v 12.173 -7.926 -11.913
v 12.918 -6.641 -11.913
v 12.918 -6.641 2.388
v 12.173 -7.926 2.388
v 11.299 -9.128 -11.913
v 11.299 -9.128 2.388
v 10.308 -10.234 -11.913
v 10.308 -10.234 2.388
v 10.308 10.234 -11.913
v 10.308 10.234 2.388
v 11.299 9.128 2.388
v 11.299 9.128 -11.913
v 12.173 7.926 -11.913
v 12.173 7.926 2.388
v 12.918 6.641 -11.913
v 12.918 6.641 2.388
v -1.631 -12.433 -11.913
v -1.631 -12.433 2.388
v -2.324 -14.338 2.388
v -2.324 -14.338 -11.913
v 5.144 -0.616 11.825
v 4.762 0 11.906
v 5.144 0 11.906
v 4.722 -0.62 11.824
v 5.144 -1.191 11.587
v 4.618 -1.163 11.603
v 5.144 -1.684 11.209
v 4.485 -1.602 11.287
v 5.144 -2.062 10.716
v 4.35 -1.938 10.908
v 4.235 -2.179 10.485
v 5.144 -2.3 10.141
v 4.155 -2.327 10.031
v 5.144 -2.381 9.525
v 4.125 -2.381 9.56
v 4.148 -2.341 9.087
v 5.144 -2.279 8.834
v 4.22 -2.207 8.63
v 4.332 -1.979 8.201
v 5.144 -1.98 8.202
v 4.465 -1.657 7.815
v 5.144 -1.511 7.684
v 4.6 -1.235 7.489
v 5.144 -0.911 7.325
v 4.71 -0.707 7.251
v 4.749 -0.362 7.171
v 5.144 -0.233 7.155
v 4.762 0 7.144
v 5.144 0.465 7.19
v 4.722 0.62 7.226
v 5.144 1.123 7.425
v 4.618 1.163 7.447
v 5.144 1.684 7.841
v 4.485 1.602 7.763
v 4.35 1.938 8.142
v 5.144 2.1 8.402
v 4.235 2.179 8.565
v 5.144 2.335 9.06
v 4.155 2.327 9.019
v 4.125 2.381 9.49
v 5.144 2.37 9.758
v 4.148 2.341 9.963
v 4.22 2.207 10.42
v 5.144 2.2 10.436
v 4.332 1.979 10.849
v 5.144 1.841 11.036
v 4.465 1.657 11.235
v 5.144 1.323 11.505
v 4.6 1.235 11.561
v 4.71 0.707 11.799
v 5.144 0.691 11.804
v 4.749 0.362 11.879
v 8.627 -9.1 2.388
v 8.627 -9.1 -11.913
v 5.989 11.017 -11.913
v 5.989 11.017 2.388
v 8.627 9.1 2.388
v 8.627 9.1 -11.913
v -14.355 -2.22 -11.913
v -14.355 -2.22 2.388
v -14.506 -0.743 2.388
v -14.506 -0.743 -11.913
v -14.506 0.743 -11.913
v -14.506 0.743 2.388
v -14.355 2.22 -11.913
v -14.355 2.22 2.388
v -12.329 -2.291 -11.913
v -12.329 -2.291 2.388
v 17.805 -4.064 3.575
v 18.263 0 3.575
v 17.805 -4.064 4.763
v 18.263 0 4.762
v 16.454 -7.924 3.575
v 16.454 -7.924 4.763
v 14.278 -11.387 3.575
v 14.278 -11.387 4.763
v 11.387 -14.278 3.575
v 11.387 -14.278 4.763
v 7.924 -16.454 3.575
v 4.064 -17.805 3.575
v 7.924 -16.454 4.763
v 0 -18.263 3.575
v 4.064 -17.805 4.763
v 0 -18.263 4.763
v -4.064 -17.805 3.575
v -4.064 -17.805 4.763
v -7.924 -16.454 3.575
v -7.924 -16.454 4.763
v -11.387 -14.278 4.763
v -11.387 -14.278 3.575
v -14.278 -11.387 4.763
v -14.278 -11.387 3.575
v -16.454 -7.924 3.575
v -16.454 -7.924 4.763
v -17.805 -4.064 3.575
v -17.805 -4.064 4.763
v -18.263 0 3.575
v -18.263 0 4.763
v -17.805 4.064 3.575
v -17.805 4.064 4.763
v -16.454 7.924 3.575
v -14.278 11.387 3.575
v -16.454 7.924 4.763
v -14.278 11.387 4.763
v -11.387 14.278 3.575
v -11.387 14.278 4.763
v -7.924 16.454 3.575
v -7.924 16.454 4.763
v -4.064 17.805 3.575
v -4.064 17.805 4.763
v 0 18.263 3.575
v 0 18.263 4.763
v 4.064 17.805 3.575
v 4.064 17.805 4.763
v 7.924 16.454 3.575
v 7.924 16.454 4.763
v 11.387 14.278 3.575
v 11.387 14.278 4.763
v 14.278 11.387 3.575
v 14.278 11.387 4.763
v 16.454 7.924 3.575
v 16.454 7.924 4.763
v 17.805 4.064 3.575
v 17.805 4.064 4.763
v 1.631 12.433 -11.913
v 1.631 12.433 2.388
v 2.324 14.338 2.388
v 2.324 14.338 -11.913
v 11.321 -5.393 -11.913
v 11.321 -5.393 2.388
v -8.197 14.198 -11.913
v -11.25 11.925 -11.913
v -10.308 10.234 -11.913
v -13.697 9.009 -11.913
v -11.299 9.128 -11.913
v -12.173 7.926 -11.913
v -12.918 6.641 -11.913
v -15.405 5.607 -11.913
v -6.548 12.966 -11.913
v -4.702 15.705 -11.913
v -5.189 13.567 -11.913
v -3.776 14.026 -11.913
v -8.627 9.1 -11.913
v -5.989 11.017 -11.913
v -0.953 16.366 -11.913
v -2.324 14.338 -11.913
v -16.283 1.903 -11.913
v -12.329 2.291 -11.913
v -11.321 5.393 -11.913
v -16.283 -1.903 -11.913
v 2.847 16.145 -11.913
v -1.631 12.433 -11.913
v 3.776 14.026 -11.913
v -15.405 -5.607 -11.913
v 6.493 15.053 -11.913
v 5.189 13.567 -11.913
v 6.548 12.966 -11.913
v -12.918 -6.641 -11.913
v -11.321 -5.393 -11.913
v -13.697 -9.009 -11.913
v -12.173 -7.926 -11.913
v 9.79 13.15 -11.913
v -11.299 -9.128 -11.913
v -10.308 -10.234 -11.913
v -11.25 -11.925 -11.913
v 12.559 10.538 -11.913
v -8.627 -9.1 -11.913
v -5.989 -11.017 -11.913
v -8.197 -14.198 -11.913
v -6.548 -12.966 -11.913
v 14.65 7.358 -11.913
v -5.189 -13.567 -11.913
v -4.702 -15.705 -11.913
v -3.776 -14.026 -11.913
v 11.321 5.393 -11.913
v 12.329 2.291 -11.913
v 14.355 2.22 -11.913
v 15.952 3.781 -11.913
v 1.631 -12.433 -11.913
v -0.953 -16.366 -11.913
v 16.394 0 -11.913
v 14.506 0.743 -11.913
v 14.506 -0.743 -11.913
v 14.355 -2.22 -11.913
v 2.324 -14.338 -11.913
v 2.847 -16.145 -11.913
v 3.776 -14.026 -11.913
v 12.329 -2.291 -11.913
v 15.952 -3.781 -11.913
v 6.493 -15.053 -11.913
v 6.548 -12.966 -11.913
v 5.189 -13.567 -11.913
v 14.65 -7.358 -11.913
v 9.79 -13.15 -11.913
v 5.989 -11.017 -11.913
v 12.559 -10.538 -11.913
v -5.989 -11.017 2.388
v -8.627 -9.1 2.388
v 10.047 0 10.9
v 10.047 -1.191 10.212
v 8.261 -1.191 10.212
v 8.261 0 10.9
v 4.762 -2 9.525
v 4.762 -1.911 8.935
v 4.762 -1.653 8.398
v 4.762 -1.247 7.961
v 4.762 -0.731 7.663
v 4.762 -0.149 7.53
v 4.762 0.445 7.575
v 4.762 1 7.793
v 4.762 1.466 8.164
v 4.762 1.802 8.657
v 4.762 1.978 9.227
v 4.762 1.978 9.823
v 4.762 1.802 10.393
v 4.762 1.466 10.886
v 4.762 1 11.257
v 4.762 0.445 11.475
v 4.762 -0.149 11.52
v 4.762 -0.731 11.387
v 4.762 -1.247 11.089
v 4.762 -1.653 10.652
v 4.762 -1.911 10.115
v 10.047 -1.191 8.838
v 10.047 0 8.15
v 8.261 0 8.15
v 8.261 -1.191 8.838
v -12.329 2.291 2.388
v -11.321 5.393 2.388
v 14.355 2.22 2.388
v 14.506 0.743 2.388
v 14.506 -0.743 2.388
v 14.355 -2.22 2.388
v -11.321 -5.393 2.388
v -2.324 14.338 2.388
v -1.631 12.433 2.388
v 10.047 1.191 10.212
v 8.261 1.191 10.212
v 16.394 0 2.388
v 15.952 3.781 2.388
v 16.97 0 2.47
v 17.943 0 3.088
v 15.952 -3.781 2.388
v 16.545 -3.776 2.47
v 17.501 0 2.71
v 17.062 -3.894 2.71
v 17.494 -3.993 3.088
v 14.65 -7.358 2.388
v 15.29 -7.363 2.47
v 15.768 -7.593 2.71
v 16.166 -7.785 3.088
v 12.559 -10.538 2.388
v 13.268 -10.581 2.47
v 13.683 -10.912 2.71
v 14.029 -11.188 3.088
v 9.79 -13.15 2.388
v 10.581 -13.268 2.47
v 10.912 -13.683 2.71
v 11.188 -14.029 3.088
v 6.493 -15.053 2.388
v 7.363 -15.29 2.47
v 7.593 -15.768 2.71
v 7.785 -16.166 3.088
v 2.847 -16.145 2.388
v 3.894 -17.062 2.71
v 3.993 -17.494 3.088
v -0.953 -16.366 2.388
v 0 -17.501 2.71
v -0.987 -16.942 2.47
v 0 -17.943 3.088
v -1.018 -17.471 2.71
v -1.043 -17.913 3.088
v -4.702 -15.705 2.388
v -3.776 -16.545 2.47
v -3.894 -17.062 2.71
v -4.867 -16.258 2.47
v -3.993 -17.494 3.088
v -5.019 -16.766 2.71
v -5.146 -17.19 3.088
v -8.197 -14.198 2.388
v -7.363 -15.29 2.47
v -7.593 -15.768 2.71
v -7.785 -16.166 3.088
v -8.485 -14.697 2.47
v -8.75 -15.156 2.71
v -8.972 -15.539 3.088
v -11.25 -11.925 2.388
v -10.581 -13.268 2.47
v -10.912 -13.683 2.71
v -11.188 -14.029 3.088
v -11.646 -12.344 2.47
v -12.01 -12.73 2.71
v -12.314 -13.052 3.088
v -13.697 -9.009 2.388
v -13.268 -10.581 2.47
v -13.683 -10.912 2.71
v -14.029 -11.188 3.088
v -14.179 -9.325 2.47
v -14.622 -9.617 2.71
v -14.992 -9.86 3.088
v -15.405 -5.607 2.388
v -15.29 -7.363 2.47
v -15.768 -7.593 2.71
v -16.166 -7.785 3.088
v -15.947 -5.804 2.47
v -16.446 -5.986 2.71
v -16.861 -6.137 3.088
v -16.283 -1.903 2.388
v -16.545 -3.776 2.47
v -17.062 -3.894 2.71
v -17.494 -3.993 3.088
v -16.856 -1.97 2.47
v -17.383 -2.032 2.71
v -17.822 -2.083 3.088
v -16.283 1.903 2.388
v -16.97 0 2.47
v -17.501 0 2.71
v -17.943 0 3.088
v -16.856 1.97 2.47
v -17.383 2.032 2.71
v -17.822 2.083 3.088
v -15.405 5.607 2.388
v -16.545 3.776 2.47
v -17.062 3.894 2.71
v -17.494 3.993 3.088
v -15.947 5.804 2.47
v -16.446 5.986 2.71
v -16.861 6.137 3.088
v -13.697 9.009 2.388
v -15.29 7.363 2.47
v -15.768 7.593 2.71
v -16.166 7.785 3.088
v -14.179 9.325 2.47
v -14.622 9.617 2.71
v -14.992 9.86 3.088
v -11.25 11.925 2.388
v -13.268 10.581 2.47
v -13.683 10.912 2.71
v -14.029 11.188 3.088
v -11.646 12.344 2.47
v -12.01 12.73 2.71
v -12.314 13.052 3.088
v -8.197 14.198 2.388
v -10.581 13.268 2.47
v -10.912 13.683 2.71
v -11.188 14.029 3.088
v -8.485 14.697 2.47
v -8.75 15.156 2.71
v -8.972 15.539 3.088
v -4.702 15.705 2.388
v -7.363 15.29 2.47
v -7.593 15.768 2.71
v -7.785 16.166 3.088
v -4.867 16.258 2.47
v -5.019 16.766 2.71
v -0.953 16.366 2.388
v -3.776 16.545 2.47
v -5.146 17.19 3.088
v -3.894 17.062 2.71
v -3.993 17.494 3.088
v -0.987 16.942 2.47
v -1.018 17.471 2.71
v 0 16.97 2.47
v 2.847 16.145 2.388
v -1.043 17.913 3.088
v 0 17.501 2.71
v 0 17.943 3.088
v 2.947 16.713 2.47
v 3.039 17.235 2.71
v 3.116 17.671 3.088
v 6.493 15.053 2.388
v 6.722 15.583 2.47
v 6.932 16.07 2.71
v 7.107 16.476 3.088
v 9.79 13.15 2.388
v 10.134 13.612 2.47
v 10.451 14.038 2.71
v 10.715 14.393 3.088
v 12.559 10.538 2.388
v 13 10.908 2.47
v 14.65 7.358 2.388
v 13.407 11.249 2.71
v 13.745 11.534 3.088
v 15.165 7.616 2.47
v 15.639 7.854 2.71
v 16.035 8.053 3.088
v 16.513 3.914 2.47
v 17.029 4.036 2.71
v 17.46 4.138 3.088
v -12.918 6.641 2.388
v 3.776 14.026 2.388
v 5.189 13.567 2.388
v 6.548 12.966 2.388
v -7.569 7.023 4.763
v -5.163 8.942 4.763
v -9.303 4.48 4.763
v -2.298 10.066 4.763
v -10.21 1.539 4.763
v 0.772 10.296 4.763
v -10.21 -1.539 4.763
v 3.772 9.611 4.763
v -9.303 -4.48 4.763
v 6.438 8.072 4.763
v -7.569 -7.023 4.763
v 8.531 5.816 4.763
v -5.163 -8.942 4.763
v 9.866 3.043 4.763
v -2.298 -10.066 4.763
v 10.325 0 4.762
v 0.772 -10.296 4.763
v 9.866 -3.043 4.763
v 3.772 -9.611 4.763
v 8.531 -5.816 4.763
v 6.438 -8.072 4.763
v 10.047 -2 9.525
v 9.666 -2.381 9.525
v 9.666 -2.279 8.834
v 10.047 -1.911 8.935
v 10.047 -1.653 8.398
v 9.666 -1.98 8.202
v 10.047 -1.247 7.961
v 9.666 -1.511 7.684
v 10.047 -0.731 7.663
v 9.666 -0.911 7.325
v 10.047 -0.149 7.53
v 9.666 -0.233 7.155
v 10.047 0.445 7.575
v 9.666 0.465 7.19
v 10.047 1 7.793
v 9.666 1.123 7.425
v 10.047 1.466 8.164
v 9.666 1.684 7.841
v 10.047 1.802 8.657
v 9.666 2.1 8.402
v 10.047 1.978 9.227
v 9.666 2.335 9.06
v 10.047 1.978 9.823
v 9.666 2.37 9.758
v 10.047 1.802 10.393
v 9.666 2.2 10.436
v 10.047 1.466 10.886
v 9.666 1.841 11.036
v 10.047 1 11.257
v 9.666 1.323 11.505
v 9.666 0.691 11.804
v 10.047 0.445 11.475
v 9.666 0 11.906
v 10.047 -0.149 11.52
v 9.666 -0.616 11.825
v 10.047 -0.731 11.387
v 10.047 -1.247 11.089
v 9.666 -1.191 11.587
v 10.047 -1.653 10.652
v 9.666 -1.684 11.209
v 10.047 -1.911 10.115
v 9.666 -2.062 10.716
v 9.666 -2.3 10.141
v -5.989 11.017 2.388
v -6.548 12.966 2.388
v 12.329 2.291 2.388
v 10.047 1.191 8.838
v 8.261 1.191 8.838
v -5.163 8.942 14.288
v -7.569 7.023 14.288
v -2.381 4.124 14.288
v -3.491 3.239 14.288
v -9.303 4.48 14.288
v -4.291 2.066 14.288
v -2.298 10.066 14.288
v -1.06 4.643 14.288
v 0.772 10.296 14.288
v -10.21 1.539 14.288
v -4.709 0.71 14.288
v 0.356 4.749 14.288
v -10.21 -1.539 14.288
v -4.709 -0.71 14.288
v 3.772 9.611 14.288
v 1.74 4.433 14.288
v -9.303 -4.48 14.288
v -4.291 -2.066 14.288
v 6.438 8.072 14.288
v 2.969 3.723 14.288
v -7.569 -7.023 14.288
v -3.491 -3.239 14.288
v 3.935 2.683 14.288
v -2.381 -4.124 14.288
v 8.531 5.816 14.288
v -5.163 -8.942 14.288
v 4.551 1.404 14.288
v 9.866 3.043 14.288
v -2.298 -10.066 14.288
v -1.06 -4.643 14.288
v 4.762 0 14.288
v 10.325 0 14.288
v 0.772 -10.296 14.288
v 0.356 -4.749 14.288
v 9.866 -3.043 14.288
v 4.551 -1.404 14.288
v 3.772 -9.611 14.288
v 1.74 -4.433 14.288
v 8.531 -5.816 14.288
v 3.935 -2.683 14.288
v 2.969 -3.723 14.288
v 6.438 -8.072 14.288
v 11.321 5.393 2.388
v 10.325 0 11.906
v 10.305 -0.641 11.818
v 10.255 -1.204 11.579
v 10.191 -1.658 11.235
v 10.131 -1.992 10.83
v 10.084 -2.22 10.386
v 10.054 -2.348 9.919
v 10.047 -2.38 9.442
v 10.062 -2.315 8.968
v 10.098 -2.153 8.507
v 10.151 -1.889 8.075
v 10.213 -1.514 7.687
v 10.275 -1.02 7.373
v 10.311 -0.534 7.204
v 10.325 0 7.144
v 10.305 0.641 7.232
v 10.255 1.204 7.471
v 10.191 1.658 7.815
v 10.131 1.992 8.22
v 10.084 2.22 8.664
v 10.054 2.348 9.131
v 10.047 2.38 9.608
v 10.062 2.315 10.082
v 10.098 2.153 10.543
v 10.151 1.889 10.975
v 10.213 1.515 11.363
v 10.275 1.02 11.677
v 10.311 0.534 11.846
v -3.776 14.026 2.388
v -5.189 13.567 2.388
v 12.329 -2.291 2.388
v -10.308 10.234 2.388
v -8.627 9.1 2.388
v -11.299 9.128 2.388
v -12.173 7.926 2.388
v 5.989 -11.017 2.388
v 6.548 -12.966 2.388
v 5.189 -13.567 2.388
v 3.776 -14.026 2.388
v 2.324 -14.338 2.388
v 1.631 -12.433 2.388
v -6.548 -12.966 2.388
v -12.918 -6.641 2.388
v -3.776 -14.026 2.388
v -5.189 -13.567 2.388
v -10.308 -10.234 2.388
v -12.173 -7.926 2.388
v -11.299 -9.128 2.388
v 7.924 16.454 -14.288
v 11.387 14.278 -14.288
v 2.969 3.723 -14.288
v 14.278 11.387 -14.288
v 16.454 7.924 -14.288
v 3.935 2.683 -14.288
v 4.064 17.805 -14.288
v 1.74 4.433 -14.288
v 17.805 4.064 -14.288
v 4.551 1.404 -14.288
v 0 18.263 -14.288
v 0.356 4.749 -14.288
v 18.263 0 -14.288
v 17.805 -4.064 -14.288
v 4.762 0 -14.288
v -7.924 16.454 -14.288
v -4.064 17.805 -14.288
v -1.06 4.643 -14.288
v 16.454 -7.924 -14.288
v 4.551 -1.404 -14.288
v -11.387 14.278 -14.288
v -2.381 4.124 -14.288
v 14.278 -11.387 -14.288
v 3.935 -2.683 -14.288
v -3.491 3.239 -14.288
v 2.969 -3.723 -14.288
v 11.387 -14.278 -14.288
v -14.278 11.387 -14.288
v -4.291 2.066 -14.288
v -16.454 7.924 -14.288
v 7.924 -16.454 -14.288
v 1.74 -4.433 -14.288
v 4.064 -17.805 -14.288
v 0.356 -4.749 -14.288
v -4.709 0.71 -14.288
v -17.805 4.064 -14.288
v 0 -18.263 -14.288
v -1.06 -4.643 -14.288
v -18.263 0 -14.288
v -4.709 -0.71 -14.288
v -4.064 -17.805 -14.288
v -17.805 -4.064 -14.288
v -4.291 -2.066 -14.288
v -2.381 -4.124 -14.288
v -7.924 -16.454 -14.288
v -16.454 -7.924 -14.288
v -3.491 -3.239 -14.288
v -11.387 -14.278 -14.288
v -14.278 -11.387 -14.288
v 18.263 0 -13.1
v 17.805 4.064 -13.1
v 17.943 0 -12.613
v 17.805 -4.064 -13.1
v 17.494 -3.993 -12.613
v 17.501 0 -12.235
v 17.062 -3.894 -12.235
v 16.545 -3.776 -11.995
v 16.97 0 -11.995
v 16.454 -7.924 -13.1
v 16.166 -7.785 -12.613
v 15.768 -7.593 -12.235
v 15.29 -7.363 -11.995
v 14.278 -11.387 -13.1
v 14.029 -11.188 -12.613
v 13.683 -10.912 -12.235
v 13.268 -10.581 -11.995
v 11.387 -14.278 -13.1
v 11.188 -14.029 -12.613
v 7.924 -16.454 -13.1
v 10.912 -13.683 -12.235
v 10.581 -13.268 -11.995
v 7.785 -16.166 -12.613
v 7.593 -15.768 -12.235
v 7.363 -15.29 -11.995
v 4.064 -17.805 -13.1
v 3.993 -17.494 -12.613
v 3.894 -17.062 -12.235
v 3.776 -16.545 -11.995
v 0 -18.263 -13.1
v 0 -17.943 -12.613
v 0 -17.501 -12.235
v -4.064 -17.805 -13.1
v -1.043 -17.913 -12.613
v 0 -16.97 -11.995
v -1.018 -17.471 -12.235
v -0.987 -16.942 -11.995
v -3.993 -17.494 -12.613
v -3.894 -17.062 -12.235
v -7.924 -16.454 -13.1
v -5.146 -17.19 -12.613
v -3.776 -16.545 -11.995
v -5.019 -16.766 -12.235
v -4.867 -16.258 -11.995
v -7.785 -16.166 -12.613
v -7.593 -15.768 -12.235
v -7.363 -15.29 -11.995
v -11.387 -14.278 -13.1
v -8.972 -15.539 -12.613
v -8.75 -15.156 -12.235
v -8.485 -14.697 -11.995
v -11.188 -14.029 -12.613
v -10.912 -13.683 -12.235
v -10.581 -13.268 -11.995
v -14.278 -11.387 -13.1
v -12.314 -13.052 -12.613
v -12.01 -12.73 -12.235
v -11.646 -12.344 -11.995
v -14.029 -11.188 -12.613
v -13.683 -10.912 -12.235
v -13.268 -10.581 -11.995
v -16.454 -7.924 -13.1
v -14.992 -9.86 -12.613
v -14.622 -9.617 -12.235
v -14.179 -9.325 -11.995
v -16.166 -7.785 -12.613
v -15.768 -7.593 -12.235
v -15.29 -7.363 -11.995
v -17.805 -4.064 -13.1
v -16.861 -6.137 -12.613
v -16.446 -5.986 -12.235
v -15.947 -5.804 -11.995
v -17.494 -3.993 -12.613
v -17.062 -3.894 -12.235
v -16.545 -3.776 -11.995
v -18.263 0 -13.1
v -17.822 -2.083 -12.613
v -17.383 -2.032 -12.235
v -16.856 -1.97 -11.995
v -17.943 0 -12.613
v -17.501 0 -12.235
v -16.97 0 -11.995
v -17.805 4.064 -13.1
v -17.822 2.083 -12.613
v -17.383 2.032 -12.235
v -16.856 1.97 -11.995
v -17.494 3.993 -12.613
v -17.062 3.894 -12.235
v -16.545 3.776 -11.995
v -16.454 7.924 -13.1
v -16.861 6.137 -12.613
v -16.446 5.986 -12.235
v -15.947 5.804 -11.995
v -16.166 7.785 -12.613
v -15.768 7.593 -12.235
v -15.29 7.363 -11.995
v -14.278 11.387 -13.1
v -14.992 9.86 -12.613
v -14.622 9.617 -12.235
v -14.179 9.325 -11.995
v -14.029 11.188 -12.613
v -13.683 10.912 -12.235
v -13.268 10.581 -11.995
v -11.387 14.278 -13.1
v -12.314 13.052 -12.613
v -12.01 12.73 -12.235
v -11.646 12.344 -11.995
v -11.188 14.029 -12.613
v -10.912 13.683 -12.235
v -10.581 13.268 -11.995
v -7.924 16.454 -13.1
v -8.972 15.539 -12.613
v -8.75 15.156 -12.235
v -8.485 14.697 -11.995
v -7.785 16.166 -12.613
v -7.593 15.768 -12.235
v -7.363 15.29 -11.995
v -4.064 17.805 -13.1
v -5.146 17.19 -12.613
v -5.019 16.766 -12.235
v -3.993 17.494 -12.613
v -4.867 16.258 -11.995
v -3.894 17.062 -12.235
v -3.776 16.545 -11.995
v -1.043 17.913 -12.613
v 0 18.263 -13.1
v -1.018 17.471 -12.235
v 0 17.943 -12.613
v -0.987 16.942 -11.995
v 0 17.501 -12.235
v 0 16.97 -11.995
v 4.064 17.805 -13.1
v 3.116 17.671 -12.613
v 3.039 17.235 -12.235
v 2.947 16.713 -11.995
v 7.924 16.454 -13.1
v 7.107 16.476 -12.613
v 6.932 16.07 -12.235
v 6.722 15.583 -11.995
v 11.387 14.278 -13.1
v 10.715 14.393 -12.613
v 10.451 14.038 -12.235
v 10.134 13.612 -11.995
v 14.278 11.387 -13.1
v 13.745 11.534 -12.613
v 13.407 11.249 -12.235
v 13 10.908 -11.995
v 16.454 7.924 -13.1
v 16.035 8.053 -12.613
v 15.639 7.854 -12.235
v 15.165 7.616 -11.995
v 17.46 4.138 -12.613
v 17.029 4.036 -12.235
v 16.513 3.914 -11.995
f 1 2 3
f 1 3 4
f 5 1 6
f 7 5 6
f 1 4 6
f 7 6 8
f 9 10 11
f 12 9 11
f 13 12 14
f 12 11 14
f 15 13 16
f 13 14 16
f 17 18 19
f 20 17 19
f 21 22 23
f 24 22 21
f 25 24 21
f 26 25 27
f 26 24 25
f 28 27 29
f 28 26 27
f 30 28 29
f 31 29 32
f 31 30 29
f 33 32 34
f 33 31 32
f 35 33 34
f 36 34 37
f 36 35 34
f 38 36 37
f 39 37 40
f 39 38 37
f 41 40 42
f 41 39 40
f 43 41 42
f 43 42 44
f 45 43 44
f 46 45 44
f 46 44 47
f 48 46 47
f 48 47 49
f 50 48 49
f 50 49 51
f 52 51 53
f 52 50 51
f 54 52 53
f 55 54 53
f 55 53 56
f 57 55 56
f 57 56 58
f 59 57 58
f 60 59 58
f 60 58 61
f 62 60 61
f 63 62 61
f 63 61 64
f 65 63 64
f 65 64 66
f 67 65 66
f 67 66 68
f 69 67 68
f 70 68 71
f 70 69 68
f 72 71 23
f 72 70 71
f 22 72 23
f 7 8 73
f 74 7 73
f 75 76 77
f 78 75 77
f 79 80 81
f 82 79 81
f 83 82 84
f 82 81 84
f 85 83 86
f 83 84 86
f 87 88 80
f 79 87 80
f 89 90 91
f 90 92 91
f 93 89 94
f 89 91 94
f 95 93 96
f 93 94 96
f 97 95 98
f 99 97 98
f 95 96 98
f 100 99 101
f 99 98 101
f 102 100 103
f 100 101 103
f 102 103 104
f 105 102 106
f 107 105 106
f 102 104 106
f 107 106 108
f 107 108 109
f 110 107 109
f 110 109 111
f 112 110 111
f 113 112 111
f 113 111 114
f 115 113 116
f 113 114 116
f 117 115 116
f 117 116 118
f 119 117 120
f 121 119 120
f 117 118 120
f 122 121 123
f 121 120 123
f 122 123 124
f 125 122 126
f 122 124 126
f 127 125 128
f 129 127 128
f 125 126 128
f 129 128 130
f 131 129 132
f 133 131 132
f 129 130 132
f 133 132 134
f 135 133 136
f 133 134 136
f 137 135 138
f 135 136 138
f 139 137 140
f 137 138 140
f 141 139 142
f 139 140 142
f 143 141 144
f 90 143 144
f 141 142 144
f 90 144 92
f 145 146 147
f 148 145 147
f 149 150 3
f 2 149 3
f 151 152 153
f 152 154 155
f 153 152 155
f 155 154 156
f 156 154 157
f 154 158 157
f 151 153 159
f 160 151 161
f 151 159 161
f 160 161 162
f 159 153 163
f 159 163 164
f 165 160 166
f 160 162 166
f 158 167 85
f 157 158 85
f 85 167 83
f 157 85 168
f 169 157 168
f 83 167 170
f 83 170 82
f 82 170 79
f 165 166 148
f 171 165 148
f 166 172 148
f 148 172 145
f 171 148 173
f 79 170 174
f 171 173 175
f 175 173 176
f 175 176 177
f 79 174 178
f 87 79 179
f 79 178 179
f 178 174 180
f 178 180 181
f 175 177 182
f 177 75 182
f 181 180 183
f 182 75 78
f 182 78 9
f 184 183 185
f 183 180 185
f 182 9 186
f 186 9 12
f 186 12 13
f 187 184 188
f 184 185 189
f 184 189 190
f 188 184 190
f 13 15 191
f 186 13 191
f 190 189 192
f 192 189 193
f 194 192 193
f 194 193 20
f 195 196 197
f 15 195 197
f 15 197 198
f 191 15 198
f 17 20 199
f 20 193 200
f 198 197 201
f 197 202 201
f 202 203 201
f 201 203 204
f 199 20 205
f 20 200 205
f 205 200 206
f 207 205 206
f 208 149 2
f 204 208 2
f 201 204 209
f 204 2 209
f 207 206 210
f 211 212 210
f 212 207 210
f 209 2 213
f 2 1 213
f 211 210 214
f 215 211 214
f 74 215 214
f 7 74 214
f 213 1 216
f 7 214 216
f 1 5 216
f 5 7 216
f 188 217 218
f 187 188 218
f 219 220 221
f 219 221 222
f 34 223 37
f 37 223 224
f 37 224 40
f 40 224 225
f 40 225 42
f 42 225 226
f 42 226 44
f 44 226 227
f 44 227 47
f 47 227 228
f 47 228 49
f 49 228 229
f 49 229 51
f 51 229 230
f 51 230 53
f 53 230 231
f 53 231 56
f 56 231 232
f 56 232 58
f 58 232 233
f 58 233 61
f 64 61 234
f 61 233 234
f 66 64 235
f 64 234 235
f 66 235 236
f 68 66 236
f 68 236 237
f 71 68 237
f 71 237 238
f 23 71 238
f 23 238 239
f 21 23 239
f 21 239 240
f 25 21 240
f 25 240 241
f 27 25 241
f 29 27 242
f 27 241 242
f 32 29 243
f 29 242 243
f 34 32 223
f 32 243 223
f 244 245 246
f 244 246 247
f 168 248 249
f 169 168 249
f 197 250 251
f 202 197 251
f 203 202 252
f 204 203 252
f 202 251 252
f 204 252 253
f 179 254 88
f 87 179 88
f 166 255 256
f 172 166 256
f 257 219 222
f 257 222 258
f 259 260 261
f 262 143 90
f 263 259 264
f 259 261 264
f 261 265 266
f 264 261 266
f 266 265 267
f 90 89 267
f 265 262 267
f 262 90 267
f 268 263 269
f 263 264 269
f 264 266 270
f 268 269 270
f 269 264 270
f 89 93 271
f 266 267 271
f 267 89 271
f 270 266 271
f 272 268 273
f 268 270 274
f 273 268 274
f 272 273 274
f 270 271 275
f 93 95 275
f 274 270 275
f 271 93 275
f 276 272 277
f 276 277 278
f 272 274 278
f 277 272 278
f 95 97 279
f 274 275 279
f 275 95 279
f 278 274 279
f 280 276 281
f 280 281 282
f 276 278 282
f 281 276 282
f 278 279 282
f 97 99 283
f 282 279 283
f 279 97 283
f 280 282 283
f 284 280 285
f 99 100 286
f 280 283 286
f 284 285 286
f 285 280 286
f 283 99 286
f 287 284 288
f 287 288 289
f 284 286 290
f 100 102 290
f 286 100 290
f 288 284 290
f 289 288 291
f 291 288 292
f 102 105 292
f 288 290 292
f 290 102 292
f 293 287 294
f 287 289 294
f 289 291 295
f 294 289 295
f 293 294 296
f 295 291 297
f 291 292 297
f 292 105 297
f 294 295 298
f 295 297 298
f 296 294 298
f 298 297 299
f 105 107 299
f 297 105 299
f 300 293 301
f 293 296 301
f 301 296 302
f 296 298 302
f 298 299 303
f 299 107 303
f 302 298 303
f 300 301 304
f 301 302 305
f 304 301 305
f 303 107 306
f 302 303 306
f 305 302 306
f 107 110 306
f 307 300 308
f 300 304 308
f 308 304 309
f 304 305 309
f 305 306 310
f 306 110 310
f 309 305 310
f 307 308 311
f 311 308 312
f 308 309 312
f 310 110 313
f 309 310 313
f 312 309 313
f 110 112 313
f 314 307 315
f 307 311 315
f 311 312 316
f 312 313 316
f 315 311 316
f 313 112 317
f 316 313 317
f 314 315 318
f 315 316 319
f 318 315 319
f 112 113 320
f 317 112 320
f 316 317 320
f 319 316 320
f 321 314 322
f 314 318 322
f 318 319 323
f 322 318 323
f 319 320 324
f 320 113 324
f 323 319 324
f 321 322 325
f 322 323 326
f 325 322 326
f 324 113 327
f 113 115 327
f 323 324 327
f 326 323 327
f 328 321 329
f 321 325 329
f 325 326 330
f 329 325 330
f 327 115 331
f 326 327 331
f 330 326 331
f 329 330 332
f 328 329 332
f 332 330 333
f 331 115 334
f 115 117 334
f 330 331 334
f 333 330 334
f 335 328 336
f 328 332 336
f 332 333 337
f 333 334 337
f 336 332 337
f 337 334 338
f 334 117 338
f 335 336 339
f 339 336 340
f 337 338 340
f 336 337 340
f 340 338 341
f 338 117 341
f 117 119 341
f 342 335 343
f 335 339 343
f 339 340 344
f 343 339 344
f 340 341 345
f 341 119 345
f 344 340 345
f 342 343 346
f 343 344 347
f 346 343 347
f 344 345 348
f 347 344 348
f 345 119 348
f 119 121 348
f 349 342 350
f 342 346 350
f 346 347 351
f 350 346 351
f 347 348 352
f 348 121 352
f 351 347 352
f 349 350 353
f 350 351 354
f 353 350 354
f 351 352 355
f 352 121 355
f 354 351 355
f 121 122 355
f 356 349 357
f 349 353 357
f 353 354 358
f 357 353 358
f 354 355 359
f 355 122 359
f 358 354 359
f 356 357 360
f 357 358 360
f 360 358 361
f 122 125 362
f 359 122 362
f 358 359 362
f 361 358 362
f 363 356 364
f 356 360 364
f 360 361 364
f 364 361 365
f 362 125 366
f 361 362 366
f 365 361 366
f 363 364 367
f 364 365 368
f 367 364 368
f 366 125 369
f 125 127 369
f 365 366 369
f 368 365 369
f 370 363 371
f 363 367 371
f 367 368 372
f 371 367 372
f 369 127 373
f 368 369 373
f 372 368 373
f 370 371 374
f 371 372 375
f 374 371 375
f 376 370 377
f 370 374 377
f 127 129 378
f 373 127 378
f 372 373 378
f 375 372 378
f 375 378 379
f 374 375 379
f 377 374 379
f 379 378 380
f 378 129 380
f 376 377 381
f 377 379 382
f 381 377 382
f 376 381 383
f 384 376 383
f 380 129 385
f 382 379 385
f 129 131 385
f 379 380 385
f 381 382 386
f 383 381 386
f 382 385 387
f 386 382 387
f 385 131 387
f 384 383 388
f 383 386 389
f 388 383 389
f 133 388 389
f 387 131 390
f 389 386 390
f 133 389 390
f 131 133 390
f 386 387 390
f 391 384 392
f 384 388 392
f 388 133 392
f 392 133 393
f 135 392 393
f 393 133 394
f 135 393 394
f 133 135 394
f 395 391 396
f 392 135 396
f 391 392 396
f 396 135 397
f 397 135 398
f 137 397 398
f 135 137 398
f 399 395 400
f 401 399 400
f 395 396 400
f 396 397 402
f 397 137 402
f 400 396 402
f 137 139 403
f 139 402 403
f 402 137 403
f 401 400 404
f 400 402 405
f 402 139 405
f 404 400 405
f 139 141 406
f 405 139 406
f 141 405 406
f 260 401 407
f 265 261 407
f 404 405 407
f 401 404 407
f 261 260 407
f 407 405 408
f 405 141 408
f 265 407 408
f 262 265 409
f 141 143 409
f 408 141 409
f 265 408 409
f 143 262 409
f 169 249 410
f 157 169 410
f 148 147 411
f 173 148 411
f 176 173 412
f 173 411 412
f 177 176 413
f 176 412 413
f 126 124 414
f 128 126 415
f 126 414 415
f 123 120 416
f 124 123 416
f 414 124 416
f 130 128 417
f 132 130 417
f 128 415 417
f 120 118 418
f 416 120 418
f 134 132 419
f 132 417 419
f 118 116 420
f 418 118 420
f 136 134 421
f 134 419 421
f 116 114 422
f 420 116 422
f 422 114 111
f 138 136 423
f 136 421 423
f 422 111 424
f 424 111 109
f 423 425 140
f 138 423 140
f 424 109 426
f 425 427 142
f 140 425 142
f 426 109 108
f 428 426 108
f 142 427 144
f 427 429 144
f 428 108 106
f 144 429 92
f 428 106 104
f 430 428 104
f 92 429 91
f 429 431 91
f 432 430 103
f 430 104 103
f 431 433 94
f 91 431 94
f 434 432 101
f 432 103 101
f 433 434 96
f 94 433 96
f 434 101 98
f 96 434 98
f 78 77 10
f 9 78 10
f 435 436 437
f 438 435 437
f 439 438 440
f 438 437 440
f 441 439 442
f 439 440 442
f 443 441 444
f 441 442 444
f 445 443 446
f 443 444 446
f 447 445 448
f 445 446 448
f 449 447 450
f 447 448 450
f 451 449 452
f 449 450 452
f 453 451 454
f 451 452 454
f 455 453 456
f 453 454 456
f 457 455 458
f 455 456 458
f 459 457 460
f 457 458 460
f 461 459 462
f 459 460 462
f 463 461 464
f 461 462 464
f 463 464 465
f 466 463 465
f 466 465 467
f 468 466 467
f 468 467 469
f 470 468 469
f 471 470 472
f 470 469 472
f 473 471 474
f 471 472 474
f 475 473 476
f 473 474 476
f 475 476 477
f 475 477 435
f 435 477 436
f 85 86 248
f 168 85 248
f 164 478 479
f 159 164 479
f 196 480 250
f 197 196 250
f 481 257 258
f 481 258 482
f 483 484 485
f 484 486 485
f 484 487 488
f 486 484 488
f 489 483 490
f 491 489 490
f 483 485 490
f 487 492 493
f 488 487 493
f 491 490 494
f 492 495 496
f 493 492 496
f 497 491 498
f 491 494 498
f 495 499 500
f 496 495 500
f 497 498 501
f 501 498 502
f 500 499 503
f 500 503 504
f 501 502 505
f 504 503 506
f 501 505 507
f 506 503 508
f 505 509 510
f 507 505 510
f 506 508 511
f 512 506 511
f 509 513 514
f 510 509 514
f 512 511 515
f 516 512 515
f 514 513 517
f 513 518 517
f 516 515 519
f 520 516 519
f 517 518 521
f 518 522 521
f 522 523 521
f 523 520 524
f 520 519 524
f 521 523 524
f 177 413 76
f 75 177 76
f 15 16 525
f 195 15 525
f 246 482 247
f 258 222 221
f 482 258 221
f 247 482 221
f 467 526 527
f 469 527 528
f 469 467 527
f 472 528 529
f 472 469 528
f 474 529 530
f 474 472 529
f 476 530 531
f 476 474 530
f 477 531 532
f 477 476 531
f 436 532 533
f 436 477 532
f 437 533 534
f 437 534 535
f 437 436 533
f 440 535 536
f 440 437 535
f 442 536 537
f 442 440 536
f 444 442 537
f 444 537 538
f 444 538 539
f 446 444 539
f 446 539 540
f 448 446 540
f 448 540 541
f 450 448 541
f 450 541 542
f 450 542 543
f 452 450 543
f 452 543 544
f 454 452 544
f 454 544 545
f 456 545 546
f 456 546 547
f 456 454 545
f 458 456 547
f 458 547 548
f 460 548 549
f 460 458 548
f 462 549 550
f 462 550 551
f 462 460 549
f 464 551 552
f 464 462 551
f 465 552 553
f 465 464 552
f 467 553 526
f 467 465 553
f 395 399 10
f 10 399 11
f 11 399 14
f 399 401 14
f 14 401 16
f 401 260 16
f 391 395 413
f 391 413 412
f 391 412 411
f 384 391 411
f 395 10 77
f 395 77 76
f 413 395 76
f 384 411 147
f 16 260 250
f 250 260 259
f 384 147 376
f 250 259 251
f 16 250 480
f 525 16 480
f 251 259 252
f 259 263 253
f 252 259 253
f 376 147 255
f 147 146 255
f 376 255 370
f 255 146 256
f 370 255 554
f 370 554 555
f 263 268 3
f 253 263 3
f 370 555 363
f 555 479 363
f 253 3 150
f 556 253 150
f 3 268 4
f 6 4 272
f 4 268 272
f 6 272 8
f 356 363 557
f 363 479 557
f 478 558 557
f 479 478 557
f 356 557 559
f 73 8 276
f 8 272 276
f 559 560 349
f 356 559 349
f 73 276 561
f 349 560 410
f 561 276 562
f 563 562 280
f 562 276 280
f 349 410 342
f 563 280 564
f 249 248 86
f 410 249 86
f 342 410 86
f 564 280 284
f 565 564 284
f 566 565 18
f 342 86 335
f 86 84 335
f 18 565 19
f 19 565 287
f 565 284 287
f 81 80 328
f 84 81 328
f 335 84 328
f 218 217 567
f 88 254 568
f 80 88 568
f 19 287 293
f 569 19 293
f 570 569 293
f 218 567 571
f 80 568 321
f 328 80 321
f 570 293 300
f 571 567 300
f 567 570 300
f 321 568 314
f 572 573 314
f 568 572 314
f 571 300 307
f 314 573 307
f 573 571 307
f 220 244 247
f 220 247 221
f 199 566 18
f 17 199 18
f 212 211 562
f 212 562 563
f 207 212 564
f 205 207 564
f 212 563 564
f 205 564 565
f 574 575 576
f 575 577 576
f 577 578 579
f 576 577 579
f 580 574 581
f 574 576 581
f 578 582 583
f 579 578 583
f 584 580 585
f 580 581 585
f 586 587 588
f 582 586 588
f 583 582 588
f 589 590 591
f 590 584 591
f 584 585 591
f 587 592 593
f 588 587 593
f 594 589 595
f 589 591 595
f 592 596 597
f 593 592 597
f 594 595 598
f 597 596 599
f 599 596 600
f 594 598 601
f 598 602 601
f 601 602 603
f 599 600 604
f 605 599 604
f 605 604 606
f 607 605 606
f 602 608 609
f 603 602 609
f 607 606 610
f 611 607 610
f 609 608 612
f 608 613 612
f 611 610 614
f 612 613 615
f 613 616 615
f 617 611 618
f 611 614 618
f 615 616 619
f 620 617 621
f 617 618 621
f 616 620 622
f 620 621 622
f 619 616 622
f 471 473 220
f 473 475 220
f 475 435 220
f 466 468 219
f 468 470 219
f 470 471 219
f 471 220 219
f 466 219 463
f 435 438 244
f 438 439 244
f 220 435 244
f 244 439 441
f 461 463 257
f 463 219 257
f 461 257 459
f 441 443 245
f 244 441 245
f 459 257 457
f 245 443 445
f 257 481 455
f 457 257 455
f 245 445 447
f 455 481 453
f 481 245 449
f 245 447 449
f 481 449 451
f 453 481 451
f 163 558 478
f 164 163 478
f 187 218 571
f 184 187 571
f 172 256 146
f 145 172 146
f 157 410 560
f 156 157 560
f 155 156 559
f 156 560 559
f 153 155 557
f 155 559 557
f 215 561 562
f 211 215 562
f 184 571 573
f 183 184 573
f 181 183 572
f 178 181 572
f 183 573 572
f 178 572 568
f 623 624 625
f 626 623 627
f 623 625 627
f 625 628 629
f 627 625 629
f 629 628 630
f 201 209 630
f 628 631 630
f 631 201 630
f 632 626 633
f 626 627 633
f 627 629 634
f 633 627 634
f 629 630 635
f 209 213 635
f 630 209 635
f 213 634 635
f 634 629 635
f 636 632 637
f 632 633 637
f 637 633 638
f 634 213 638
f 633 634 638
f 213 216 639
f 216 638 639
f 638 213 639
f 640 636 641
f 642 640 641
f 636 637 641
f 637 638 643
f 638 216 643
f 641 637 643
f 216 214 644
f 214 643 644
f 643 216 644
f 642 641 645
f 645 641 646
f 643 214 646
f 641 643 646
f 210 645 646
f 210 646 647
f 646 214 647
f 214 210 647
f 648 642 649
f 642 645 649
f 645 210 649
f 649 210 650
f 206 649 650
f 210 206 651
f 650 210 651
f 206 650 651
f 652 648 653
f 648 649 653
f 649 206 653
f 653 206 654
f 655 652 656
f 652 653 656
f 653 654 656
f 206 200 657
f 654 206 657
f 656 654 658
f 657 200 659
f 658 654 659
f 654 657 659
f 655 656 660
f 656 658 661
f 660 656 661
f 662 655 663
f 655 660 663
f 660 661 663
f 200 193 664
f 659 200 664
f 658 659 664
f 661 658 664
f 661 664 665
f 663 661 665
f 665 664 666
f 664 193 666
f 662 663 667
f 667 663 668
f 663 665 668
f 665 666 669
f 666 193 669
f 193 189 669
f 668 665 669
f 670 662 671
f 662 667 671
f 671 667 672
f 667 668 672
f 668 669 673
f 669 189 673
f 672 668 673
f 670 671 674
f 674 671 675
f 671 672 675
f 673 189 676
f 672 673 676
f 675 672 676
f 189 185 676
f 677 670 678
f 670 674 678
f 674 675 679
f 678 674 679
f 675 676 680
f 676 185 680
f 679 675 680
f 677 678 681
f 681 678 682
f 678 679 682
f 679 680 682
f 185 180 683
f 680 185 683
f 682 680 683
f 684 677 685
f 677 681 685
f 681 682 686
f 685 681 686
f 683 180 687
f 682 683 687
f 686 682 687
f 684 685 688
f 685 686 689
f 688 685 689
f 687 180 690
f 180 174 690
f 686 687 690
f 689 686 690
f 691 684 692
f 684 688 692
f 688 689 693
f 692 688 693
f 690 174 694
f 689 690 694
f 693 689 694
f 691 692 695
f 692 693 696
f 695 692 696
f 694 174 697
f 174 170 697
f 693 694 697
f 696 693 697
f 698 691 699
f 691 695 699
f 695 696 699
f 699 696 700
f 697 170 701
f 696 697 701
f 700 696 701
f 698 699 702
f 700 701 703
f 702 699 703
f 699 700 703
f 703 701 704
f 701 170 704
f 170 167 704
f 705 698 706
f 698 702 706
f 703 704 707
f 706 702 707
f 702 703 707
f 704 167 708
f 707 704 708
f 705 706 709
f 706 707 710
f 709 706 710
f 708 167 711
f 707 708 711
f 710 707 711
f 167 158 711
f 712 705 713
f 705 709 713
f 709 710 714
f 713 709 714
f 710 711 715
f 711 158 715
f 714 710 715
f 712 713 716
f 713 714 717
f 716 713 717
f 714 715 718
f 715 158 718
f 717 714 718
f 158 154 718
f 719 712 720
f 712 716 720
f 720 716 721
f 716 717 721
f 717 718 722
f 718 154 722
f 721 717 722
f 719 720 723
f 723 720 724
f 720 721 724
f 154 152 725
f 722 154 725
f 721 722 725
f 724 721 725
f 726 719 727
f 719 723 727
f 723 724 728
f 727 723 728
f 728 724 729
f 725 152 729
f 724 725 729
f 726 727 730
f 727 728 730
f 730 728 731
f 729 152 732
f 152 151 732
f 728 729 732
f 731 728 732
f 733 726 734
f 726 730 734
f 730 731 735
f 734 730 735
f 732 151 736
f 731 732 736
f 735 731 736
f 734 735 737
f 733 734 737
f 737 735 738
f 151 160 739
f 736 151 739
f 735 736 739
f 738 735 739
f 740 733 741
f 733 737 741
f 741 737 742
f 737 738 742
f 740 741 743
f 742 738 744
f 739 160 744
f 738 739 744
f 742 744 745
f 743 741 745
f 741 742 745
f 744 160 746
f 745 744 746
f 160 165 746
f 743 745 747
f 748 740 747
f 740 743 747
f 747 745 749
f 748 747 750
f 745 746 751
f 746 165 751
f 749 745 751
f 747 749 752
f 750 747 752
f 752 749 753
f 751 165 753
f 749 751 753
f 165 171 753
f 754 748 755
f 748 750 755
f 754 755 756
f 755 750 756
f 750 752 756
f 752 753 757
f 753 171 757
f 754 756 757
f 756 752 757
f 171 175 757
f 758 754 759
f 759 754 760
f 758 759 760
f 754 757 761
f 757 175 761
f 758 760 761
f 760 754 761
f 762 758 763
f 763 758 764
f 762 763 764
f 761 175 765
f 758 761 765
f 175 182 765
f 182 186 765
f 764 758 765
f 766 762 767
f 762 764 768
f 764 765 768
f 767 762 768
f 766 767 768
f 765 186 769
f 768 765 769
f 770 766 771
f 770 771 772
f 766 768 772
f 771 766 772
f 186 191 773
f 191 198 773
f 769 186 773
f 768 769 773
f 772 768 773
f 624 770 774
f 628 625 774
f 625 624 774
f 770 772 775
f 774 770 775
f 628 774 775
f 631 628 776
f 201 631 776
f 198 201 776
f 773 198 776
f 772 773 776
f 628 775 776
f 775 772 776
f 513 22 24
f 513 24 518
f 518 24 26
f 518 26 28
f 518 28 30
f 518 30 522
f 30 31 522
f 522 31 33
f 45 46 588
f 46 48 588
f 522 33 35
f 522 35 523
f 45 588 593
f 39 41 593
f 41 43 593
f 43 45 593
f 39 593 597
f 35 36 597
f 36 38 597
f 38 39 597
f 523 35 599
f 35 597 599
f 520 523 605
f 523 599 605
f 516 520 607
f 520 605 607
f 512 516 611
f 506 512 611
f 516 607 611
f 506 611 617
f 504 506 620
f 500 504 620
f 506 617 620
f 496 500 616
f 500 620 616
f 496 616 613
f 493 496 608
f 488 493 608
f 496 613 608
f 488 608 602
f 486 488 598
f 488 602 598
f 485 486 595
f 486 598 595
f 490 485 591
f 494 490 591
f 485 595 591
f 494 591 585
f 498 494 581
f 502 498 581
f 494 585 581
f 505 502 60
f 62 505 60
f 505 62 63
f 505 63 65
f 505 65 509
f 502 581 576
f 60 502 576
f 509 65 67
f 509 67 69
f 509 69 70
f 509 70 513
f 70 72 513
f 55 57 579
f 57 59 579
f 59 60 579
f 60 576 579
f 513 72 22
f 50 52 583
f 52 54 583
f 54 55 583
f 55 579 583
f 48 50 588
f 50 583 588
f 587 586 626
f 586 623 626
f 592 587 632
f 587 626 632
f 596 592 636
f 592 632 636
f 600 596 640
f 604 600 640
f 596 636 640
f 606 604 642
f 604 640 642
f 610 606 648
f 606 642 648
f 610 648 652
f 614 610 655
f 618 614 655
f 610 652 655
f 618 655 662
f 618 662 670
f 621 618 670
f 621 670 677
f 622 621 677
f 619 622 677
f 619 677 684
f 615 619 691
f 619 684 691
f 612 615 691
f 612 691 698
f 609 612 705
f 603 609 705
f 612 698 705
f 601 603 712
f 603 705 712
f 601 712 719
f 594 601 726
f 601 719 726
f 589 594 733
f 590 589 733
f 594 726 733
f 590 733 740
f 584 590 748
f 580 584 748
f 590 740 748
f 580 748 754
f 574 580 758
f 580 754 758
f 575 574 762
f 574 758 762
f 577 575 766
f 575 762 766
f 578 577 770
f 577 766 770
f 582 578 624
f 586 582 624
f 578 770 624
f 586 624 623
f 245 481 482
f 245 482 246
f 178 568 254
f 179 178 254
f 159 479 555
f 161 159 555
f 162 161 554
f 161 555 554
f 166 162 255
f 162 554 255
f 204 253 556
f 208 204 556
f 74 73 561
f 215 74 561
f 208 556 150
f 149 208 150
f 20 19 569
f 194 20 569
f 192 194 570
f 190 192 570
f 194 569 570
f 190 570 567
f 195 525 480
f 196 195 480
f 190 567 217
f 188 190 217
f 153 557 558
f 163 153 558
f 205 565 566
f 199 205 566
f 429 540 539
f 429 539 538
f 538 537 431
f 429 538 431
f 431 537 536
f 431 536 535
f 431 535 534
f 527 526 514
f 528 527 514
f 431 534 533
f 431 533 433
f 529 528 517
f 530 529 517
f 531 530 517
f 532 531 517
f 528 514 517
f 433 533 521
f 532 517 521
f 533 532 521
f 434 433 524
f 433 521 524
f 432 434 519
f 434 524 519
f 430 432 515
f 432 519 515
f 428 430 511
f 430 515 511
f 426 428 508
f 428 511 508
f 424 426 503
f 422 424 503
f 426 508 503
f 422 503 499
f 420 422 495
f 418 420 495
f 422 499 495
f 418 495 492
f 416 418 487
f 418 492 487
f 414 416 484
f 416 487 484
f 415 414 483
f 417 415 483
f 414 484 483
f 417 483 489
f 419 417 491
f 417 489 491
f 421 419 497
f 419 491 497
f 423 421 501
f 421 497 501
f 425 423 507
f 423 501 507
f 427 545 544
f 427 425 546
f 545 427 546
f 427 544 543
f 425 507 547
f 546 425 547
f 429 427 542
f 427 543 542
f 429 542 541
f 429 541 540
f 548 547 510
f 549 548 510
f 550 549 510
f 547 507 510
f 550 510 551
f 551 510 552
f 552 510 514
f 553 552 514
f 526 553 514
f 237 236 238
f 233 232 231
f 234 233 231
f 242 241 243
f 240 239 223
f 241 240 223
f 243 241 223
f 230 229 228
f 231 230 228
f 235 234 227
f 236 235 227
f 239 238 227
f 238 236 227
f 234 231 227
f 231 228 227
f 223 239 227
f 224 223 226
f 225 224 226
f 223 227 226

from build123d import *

# Parameters (mm, degrees)
CUT_EXTRUDE1_START = 2.3876
CUT_EXTRUDE1_DEPTH = 14.3002
CIRPATTERN1_COUNT  = 10
SKETCH4_R          = 2.38125
CUT_EXTRUDE2_DEPTH = 30.51572079
CUT_EXTRUDE3_DEPTH = 1.7859375


with BuildPart() as part:
    # Sketch2 → Revolve1 (revolve)
    with BuildSketch(Plane(origin=(0, 0, 0), x_dir=(0, 0, -1), z_dir=(1, 0, 0)), mode=Mode.PRIVATE) as revolve1_sk:
        with BuildLine():
            Line((-14.2875, 4.7625), (14.2875, 4.7625))
            Line((14.2875, 4.7625), (14.2875, 18.2626))
            Line((14.2875, 18.2626), (13.10005, 18.2626))
            ThreePointArc((13.10005, 18.2626), (12.234576959, 17.500999922), (11.9126, 16.394017943))
            Line((11.9126, 16.394017943), (11.9126, 14.525435887))
            Line((11.9126, 14.525435887), (-2.3876, 14.525435887))
            Line((-2.3876, 14.525435887), (-2.3876, 16.394017943))
            ThreePointArc((-2.3876, 16.394017943), (-2.709576959, 17.500999922), (-3.57505, 18.2626))
            Line((-3.57505, 18.2626), (-4.7625, 18.2626))
            Line((-4.7625, 18.2626), (-4.7625, 10.3251))
            Line((-4.7625, 10.3251), (-14.2875, 10.3251))
            Line((-14.2875, 10.3251), (-14.2875, 4.7625))
        make_face()
    revolve(revolve1_sk.sketch.rotate(Axis((0, 0, 14.2875), (0, 0, -1)), 90), axis=Axis((0, 0, 14.2875), (0, 0, -1)))

    # Sketch3 → Cut-Extrude1 (cut)
    with BuildSketch(Plane.XY.offset(CUT_EXTRUDE1_START)):
        with BuildLine():
            Line((-1.630736704, 12.4333), (1.630736704, 12.4333))
            Line((1.630736704, 12.4333), (2.3241, 14.3383))
            ThreePointArc((2.3241, 14.3383), (0, 14.525435887), (-2.3241, 14.3383))
            Line((-2.3241, 14.3383), (-1.630736704, 12.4333))
        make_face()
    cut_extrude1 = extrude(amount=-CUT_EXTRUDE1_DEPTH, mode=Mode.SUBTRACT)

    # CirPattern1: Cut-Extrude1 ×10 about axis
    cirpattern1_axis = Axis((0, 0, 0), (0, 0, 1))
    for i in range(1, CIRPATTERN1_COUNT):
        add(cut_extrude1.rotate(cirpattern1_axis, i * 360 / CIRPATTERN1_COUNT), mode=Mode.SUBTRACT)

    # Sketch4 → Cut-Extrude2 (cut, through all)
    with BuildSketch(Plane(origin=(0, 0, 0), x_dir=(0, -1, 0), z_dir=(1, 0, 0))):
        with Locations(Location((0, -9.525, 0), (0, 0, 270))):
            Circle(SKETCH4_R)
    extrude(amount=CUT_EXTRUDE2_DEPTH, mode=Mode.SUBTRACT)

    # Sketch5 → Revolve2 (revolve)
    with BuildSketch(Plane.XY.offset(9.525)):
        Polygon((4.7625, -2.00025), (4.7625, 0), (10.046757609, 0), (10.046757609, -2.00025), (9.665757609, -2.38125), (5.1435, -2.38125), align=None)
    revolve(axis=Axis((4.7625, 0, 9.525), (1, 0, 0)))

    # Sketch6 → Cut-Extrude3 (cut)
    with BuildSketch(Plane(origin=(10.046757609, 5.384140679, 0), x_dir=(0, -1, 0), z_dir=(-1, 0, 0))):
        Polygon((5.384140679, 10.899815329), (4.193515679, 10.212407664), (4.193515679, 8.837592336), (5.384140679, 8.150184671), (6.574765679, 8.837592336), (6.574765679, 10.212407664), align=None)
    extrude(amount=CUT_EXTRUDE3_DEPTH, mode=Mode.SUBTRACT)


solid = part.part
